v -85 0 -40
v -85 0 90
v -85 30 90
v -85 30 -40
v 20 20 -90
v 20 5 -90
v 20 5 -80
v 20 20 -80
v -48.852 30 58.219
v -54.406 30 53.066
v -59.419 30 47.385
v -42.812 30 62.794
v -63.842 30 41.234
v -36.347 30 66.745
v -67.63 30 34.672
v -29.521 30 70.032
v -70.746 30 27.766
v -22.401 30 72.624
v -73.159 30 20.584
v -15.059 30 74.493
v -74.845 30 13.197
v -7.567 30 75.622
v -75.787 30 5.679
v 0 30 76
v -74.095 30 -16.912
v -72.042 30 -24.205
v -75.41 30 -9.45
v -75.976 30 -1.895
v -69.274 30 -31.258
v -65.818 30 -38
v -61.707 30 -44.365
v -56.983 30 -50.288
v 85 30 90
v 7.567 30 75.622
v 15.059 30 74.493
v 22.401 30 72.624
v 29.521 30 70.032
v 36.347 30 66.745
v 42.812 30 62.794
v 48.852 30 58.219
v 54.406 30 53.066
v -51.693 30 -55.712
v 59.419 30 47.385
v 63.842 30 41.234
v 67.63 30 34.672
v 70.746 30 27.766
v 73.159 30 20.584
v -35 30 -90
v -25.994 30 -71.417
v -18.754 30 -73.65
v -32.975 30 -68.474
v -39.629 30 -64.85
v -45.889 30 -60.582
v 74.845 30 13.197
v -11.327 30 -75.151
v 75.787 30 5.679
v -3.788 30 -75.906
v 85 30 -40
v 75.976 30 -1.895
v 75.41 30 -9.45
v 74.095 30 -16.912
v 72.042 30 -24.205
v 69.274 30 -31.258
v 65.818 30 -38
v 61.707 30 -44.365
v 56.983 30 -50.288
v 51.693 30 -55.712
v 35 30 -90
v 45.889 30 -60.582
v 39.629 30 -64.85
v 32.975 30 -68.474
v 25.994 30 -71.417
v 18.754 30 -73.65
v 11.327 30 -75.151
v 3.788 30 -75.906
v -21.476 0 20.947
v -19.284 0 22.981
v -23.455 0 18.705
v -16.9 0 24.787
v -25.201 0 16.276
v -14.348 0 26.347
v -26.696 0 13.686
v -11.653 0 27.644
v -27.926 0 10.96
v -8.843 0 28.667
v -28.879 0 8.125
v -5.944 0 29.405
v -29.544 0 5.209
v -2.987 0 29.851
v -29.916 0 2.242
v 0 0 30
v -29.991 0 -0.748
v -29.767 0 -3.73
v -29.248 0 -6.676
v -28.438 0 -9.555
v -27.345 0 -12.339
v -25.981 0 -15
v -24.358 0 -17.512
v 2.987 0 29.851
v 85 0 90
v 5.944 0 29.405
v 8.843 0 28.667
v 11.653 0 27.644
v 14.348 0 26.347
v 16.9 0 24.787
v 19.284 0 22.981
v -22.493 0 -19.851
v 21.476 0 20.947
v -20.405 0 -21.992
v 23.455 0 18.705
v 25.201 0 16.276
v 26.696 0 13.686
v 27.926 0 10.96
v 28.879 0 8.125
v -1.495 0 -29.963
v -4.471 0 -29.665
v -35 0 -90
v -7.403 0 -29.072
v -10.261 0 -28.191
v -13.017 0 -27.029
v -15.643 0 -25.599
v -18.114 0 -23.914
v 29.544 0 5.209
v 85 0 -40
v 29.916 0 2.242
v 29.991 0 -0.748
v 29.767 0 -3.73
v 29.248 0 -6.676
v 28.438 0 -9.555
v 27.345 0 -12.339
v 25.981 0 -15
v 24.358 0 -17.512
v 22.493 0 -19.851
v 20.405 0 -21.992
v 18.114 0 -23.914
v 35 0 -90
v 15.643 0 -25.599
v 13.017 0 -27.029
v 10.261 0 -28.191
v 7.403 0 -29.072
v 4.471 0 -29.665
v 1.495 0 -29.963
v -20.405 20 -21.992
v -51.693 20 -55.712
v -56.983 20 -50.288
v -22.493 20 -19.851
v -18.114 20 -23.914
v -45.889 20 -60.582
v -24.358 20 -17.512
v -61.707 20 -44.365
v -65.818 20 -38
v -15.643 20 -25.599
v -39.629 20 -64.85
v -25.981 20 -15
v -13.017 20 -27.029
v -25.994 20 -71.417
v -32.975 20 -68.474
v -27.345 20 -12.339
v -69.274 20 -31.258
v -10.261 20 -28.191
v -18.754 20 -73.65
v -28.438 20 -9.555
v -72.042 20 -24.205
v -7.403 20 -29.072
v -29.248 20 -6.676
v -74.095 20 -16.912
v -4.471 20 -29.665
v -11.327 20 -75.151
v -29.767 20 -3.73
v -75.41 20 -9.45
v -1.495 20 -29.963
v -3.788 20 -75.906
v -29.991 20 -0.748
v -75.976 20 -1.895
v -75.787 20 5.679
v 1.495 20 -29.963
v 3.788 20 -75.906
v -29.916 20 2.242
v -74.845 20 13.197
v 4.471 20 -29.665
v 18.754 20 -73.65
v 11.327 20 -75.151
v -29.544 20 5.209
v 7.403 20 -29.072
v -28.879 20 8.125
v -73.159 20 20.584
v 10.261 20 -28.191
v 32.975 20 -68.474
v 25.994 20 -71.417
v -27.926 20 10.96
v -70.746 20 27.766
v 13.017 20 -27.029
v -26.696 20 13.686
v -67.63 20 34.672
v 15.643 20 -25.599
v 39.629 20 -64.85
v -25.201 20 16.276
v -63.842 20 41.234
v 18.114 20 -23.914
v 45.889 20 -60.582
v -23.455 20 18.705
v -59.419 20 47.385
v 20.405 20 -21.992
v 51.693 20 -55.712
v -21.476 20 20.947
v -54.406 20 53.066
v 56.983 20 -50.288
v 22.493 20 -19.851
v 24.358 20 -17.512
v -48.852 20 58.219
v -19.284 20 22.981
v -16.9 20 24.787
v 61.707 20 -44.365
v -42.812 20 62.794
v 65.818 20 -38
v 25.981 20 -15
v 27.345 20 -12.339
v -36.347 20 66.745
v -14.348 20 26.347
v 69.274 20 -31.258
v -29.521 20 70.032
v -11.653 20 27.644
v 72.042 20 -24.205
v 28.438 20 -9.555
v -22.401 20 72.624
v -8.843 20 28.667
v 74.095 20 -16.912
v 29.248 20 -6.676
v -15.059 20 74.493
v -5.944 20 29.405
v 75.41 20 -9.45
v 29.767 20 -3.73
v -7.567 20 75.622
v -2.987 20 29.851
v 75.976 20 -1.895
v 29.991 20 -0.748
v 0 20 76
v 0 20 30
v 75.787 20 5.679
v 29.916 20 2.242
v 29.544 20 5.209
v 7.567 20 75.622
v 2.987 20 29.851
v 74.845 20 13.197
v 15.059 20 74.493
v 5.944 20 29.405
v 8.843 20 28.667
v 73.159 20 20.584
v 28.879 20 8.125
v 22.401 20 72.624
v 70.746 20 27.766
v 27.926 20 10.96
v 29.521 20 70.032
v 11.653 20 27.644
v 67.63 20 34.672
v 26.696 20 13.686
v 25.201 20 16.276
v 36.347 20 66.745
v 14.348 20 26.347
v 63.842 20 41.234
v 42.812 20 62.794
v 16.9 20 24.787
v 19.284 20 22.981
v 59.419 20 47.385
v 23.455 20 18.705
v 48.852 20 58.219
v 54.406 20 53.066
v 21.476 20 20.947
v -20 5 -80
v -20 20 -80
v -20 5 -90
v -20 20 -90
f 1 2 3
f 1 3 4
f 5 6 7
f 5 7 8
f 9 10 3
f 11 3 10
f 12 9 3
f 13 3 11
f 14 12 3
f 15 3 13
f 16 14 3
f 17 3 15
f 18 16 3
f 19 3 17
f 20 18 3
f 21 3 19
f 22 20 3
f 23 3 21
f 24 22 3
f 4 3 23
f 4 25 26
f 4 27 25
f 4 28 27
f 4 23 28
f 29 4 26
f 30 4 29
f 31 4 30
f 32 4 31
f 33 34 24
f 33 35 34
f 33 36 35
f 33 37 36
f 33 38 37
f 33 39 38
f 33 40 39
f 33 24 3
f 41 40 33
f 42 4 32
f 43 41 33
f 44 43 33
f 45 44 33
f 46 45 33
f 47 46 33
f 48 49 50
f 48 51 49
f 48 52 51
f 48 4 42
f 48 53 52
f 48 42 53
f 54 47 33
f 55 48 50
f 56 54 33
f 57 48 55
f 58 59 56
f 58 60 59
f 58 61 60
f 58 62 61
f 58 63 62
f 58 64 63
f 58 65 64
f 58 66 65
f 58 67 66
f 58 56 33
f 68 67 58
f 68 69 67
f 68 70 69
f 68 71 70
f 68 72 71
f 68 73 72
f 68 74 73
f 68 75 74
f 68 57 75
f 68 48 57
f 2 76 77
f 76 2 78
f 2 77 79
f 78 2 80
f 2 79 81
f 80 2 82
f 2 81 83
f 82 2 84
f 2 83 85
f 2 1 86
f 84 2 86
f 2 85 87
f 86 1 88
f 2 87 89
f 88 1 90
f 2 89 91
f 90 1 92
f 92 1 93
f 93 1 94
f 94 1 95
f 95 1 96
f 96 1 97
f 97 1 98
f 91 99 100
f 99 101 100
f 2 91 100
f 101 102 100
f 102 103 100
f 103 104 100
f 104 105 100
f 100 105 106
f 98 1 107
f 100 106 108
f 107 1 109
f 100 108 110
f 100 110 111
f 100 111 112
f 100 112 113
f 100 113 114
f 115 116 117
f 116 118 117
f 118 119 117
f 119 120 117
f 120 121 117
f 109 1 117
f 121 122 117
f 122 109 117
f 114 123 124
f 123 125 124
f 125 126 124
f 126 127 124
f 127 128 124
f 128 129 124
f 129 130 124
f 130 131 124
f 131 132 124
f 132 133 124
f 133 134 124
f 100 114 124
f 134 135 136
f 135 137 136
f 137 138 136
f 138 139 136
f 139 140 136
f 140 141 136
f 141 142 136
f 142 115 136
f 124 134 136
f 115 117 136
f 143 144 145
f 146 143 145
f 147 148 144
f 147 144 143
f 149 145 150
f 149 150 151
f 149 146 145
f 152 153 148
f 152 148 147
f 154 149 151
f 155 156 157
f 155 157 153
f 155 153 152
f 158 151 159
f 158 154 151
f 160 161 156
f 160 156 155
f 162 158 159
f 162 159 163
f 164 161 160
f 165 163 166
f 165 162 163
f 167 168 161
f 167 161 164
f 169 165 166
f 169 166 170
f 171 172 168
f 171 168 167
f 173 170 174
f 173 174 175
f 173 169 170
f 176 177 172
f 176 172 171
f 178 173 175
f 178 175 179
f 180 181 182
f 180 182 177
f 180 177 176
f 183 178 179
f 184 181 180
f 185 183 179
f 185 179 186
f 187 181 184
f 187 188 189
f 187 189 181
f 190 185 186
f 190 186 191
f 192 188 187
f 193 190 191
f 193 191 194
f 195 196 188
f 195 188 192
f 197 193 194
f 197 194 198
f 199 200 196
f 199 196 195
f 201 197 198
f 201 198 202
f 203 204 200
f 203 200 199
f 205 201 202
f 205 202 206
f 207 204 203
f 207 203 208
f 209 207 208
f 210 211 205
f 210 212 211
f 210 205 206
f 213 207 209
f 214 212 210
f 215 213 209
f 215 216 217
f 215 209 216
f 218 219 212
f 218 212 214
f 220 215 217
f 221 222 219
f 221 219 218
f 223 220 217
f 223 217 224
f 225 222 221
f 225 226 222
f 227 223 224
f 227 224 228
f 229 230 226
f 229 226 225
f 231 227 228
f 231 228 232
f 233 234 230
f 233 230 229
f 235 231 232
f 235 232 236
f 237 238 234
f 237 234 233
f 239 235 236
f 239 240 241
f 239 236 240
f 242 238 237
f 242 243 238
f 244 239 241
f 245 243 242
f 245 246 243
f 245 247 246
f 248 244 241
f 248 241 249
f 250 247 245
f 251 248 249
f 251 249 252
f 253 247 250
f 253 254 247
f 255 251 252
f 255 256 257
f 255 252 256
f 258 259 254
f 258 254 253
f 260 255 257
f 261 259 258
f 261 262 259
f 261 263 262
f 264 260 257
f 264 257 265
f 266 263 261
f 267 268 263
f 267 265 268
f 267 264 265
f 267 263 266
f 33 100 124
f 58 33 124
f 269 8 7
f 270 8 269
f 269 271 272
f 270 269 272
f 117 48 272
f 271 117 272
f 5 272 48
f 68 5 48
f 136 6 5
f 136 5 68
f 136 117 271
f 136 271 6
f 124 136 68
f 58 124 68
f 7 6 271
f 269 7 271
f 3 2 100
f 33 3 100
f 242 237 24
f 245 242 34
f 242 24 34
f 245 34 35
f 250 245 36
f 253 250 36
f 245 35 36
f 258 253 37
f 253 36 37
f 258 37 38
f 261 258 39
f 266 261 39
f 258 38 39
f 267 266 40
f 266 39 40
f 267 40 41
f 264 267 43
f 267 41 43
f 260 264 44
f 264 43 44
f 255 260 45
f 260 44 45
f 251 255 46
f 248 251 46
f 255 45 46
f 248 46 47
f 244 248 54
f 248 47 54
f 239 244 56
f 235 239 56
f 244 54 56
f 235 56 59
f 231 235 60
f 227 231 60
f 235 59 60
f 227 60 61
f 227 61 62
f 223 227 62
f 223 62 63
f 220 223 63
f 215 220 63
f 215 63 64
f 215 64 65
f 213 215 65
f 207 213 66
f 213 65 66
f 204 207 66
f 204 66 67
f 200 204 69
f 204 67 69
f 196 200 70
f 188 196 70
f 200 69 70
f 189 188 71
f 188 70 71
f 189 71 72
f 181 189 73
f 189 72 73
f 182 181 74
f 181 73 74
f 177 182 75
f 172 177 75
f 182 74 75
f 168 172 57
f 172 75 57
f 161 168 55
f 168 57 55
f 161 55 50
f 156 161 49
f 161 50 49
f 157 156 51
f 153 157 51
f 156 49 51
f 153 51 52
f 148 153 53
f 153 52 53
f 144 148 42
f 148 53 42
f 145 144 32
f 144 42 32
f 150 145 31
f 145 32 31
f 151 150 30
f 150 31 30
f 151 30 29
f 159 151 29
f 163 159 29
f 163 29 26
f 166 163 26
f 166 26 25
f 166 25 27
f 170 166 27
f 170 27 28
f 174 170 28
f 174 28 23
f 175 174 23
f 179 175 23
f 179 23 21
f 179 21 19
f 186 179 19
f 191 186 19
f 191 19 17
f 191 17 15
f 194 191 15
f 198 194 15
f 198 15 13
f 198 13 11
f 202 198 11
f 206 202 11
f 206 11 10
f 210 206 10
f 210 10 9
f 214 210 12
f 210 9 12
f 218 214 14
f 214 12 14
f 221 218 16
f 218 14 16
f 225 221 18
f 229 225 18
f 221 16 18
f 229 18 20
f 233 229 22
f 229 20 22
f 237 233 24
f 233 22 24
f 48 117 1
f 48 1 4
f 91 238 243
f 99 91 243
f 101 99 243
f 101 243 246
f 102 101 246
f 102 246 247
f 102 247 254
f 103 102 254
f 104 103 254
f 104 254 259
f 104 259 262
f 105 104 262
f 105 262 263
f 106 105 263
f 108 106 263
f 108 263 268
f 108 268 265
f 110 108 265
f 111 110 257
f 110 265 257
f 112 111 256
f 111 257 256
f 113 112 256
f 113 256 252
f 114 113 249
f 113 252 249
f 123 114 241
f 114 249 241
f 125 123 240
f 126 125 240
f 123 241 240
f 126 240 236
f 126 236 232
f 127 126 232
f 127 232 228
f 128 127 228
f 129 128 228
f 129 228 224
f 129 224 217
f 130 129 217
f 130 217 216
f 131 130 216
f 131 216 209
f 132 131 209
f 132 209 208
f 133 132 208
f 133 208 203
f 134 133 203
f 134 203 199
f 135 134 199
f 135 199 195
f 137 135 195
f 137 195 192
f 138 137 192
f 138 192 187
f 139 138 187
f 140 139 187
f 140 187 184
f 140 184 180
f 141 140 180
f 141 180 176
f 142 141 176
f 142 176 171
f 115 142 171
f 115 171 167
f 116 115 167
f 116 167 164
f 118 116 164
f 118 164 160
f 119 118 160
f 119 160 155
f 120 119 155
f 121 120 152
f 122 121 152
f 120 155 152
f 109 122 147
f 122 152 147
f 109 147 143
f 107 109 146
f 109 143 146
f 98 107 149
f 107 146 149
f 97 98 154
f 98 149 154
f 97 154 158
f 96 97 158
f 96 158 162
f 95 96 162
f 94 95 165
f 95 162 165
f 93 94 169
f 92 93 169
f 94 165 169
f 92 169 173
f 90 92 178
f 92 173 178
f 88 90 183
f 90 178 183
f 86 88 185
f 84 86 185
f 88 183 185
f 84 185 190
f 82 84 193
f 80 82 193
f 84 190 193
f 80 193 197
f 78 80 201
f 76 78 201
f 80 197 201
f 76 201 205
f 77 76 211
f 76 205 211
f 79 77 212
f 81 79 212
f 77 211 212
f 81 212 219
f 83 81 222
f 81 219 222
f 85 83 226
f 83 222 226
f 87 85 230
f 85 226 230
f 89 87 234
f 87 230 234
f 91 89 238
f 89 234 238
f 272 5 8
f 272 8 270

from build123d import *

# Parameters (mm, degrees)
SKETCH_1_W          = 170
SKETCH_1_H          = 180
EXTRUDE_1_DEPTH     = 30
CHAMFER_1_SIZE      = 50
SKETCH_3_R          = 76
CUT_EXTRUDE_1_DEPTH = 10
SKETCH_4_R          = 30
CUT_EXTRUDE_2_DEPTH = 126.39936204
SKETCH_5_W          = 40
SKETCH_5_H          = 15
CUT_EXTRUDE_3_DEPTH = 10


with BuildPart() as part:
    # 草图1 → 凸台-拉伸1 (new body)
    with BuildSketch(Plane(origin=(0, 0, 0), x_dir=(1, 0, 0), z_dir=(0, 1, 0))):
        Rectangle(SKETCH_1_W, SKETCH_1_H)
    extrude(amount=EXTRUDE_1_DEPTH)

    # 倒角1
    chamfer_1_edges = [part.edges().sort_by_distance(p)[0] for p in [
        (-85, 15, -90),
        (85, 15, -90),
    ]]
    chamfer(chamfer_1_edges, length=CHAMFER_1_SIZE)

    # 草图3 → 切除-拉伸1 (cut)
    with BuildSketch(Plane(origin=(0, 30, 0), x_dir=(1, 0, 0), z_dir=(0, 1, 0))):
        with Locations(Location((0, 0, 0), (0, 0, 270))):
            Circle(SKETCH_3_R)
    extrude(amount=-CUT_EXTRUDE_1_DEPTH, mode=Mode.SUBTRACT)

    # 草图4 → 切除-拉伸2 (cut, through all)
    with BuildSketch(Plane(origin=(0, 20, 0), x_dir=(1, 0, 0), z_dir=(0, 1, 0))):
        with Locations(Location((0, 0, 0), (0, 0, 270))):
            Circle(SKETCH_4_R)
    extrude(amount=-CUT_EXTRUDE_2_DEPTH, mode=Mode.SUBTRACT)

    # 草图5 → 切除-拉伸3 (cut)
    with BuildSketch(Plane(origin=(0, 0, -90), x_dir=(-1, 0, 0), z_dir=(0, 0, -1))):
        with Locations((0, 12.5)):
            Rectangle(SKETCH_5_W, SKETCH_5_H)
    extrude(amount=-CUT_EXTRUDE_3_DEPTH, mode=Mode.SUBTRACT)


solid = part.part
